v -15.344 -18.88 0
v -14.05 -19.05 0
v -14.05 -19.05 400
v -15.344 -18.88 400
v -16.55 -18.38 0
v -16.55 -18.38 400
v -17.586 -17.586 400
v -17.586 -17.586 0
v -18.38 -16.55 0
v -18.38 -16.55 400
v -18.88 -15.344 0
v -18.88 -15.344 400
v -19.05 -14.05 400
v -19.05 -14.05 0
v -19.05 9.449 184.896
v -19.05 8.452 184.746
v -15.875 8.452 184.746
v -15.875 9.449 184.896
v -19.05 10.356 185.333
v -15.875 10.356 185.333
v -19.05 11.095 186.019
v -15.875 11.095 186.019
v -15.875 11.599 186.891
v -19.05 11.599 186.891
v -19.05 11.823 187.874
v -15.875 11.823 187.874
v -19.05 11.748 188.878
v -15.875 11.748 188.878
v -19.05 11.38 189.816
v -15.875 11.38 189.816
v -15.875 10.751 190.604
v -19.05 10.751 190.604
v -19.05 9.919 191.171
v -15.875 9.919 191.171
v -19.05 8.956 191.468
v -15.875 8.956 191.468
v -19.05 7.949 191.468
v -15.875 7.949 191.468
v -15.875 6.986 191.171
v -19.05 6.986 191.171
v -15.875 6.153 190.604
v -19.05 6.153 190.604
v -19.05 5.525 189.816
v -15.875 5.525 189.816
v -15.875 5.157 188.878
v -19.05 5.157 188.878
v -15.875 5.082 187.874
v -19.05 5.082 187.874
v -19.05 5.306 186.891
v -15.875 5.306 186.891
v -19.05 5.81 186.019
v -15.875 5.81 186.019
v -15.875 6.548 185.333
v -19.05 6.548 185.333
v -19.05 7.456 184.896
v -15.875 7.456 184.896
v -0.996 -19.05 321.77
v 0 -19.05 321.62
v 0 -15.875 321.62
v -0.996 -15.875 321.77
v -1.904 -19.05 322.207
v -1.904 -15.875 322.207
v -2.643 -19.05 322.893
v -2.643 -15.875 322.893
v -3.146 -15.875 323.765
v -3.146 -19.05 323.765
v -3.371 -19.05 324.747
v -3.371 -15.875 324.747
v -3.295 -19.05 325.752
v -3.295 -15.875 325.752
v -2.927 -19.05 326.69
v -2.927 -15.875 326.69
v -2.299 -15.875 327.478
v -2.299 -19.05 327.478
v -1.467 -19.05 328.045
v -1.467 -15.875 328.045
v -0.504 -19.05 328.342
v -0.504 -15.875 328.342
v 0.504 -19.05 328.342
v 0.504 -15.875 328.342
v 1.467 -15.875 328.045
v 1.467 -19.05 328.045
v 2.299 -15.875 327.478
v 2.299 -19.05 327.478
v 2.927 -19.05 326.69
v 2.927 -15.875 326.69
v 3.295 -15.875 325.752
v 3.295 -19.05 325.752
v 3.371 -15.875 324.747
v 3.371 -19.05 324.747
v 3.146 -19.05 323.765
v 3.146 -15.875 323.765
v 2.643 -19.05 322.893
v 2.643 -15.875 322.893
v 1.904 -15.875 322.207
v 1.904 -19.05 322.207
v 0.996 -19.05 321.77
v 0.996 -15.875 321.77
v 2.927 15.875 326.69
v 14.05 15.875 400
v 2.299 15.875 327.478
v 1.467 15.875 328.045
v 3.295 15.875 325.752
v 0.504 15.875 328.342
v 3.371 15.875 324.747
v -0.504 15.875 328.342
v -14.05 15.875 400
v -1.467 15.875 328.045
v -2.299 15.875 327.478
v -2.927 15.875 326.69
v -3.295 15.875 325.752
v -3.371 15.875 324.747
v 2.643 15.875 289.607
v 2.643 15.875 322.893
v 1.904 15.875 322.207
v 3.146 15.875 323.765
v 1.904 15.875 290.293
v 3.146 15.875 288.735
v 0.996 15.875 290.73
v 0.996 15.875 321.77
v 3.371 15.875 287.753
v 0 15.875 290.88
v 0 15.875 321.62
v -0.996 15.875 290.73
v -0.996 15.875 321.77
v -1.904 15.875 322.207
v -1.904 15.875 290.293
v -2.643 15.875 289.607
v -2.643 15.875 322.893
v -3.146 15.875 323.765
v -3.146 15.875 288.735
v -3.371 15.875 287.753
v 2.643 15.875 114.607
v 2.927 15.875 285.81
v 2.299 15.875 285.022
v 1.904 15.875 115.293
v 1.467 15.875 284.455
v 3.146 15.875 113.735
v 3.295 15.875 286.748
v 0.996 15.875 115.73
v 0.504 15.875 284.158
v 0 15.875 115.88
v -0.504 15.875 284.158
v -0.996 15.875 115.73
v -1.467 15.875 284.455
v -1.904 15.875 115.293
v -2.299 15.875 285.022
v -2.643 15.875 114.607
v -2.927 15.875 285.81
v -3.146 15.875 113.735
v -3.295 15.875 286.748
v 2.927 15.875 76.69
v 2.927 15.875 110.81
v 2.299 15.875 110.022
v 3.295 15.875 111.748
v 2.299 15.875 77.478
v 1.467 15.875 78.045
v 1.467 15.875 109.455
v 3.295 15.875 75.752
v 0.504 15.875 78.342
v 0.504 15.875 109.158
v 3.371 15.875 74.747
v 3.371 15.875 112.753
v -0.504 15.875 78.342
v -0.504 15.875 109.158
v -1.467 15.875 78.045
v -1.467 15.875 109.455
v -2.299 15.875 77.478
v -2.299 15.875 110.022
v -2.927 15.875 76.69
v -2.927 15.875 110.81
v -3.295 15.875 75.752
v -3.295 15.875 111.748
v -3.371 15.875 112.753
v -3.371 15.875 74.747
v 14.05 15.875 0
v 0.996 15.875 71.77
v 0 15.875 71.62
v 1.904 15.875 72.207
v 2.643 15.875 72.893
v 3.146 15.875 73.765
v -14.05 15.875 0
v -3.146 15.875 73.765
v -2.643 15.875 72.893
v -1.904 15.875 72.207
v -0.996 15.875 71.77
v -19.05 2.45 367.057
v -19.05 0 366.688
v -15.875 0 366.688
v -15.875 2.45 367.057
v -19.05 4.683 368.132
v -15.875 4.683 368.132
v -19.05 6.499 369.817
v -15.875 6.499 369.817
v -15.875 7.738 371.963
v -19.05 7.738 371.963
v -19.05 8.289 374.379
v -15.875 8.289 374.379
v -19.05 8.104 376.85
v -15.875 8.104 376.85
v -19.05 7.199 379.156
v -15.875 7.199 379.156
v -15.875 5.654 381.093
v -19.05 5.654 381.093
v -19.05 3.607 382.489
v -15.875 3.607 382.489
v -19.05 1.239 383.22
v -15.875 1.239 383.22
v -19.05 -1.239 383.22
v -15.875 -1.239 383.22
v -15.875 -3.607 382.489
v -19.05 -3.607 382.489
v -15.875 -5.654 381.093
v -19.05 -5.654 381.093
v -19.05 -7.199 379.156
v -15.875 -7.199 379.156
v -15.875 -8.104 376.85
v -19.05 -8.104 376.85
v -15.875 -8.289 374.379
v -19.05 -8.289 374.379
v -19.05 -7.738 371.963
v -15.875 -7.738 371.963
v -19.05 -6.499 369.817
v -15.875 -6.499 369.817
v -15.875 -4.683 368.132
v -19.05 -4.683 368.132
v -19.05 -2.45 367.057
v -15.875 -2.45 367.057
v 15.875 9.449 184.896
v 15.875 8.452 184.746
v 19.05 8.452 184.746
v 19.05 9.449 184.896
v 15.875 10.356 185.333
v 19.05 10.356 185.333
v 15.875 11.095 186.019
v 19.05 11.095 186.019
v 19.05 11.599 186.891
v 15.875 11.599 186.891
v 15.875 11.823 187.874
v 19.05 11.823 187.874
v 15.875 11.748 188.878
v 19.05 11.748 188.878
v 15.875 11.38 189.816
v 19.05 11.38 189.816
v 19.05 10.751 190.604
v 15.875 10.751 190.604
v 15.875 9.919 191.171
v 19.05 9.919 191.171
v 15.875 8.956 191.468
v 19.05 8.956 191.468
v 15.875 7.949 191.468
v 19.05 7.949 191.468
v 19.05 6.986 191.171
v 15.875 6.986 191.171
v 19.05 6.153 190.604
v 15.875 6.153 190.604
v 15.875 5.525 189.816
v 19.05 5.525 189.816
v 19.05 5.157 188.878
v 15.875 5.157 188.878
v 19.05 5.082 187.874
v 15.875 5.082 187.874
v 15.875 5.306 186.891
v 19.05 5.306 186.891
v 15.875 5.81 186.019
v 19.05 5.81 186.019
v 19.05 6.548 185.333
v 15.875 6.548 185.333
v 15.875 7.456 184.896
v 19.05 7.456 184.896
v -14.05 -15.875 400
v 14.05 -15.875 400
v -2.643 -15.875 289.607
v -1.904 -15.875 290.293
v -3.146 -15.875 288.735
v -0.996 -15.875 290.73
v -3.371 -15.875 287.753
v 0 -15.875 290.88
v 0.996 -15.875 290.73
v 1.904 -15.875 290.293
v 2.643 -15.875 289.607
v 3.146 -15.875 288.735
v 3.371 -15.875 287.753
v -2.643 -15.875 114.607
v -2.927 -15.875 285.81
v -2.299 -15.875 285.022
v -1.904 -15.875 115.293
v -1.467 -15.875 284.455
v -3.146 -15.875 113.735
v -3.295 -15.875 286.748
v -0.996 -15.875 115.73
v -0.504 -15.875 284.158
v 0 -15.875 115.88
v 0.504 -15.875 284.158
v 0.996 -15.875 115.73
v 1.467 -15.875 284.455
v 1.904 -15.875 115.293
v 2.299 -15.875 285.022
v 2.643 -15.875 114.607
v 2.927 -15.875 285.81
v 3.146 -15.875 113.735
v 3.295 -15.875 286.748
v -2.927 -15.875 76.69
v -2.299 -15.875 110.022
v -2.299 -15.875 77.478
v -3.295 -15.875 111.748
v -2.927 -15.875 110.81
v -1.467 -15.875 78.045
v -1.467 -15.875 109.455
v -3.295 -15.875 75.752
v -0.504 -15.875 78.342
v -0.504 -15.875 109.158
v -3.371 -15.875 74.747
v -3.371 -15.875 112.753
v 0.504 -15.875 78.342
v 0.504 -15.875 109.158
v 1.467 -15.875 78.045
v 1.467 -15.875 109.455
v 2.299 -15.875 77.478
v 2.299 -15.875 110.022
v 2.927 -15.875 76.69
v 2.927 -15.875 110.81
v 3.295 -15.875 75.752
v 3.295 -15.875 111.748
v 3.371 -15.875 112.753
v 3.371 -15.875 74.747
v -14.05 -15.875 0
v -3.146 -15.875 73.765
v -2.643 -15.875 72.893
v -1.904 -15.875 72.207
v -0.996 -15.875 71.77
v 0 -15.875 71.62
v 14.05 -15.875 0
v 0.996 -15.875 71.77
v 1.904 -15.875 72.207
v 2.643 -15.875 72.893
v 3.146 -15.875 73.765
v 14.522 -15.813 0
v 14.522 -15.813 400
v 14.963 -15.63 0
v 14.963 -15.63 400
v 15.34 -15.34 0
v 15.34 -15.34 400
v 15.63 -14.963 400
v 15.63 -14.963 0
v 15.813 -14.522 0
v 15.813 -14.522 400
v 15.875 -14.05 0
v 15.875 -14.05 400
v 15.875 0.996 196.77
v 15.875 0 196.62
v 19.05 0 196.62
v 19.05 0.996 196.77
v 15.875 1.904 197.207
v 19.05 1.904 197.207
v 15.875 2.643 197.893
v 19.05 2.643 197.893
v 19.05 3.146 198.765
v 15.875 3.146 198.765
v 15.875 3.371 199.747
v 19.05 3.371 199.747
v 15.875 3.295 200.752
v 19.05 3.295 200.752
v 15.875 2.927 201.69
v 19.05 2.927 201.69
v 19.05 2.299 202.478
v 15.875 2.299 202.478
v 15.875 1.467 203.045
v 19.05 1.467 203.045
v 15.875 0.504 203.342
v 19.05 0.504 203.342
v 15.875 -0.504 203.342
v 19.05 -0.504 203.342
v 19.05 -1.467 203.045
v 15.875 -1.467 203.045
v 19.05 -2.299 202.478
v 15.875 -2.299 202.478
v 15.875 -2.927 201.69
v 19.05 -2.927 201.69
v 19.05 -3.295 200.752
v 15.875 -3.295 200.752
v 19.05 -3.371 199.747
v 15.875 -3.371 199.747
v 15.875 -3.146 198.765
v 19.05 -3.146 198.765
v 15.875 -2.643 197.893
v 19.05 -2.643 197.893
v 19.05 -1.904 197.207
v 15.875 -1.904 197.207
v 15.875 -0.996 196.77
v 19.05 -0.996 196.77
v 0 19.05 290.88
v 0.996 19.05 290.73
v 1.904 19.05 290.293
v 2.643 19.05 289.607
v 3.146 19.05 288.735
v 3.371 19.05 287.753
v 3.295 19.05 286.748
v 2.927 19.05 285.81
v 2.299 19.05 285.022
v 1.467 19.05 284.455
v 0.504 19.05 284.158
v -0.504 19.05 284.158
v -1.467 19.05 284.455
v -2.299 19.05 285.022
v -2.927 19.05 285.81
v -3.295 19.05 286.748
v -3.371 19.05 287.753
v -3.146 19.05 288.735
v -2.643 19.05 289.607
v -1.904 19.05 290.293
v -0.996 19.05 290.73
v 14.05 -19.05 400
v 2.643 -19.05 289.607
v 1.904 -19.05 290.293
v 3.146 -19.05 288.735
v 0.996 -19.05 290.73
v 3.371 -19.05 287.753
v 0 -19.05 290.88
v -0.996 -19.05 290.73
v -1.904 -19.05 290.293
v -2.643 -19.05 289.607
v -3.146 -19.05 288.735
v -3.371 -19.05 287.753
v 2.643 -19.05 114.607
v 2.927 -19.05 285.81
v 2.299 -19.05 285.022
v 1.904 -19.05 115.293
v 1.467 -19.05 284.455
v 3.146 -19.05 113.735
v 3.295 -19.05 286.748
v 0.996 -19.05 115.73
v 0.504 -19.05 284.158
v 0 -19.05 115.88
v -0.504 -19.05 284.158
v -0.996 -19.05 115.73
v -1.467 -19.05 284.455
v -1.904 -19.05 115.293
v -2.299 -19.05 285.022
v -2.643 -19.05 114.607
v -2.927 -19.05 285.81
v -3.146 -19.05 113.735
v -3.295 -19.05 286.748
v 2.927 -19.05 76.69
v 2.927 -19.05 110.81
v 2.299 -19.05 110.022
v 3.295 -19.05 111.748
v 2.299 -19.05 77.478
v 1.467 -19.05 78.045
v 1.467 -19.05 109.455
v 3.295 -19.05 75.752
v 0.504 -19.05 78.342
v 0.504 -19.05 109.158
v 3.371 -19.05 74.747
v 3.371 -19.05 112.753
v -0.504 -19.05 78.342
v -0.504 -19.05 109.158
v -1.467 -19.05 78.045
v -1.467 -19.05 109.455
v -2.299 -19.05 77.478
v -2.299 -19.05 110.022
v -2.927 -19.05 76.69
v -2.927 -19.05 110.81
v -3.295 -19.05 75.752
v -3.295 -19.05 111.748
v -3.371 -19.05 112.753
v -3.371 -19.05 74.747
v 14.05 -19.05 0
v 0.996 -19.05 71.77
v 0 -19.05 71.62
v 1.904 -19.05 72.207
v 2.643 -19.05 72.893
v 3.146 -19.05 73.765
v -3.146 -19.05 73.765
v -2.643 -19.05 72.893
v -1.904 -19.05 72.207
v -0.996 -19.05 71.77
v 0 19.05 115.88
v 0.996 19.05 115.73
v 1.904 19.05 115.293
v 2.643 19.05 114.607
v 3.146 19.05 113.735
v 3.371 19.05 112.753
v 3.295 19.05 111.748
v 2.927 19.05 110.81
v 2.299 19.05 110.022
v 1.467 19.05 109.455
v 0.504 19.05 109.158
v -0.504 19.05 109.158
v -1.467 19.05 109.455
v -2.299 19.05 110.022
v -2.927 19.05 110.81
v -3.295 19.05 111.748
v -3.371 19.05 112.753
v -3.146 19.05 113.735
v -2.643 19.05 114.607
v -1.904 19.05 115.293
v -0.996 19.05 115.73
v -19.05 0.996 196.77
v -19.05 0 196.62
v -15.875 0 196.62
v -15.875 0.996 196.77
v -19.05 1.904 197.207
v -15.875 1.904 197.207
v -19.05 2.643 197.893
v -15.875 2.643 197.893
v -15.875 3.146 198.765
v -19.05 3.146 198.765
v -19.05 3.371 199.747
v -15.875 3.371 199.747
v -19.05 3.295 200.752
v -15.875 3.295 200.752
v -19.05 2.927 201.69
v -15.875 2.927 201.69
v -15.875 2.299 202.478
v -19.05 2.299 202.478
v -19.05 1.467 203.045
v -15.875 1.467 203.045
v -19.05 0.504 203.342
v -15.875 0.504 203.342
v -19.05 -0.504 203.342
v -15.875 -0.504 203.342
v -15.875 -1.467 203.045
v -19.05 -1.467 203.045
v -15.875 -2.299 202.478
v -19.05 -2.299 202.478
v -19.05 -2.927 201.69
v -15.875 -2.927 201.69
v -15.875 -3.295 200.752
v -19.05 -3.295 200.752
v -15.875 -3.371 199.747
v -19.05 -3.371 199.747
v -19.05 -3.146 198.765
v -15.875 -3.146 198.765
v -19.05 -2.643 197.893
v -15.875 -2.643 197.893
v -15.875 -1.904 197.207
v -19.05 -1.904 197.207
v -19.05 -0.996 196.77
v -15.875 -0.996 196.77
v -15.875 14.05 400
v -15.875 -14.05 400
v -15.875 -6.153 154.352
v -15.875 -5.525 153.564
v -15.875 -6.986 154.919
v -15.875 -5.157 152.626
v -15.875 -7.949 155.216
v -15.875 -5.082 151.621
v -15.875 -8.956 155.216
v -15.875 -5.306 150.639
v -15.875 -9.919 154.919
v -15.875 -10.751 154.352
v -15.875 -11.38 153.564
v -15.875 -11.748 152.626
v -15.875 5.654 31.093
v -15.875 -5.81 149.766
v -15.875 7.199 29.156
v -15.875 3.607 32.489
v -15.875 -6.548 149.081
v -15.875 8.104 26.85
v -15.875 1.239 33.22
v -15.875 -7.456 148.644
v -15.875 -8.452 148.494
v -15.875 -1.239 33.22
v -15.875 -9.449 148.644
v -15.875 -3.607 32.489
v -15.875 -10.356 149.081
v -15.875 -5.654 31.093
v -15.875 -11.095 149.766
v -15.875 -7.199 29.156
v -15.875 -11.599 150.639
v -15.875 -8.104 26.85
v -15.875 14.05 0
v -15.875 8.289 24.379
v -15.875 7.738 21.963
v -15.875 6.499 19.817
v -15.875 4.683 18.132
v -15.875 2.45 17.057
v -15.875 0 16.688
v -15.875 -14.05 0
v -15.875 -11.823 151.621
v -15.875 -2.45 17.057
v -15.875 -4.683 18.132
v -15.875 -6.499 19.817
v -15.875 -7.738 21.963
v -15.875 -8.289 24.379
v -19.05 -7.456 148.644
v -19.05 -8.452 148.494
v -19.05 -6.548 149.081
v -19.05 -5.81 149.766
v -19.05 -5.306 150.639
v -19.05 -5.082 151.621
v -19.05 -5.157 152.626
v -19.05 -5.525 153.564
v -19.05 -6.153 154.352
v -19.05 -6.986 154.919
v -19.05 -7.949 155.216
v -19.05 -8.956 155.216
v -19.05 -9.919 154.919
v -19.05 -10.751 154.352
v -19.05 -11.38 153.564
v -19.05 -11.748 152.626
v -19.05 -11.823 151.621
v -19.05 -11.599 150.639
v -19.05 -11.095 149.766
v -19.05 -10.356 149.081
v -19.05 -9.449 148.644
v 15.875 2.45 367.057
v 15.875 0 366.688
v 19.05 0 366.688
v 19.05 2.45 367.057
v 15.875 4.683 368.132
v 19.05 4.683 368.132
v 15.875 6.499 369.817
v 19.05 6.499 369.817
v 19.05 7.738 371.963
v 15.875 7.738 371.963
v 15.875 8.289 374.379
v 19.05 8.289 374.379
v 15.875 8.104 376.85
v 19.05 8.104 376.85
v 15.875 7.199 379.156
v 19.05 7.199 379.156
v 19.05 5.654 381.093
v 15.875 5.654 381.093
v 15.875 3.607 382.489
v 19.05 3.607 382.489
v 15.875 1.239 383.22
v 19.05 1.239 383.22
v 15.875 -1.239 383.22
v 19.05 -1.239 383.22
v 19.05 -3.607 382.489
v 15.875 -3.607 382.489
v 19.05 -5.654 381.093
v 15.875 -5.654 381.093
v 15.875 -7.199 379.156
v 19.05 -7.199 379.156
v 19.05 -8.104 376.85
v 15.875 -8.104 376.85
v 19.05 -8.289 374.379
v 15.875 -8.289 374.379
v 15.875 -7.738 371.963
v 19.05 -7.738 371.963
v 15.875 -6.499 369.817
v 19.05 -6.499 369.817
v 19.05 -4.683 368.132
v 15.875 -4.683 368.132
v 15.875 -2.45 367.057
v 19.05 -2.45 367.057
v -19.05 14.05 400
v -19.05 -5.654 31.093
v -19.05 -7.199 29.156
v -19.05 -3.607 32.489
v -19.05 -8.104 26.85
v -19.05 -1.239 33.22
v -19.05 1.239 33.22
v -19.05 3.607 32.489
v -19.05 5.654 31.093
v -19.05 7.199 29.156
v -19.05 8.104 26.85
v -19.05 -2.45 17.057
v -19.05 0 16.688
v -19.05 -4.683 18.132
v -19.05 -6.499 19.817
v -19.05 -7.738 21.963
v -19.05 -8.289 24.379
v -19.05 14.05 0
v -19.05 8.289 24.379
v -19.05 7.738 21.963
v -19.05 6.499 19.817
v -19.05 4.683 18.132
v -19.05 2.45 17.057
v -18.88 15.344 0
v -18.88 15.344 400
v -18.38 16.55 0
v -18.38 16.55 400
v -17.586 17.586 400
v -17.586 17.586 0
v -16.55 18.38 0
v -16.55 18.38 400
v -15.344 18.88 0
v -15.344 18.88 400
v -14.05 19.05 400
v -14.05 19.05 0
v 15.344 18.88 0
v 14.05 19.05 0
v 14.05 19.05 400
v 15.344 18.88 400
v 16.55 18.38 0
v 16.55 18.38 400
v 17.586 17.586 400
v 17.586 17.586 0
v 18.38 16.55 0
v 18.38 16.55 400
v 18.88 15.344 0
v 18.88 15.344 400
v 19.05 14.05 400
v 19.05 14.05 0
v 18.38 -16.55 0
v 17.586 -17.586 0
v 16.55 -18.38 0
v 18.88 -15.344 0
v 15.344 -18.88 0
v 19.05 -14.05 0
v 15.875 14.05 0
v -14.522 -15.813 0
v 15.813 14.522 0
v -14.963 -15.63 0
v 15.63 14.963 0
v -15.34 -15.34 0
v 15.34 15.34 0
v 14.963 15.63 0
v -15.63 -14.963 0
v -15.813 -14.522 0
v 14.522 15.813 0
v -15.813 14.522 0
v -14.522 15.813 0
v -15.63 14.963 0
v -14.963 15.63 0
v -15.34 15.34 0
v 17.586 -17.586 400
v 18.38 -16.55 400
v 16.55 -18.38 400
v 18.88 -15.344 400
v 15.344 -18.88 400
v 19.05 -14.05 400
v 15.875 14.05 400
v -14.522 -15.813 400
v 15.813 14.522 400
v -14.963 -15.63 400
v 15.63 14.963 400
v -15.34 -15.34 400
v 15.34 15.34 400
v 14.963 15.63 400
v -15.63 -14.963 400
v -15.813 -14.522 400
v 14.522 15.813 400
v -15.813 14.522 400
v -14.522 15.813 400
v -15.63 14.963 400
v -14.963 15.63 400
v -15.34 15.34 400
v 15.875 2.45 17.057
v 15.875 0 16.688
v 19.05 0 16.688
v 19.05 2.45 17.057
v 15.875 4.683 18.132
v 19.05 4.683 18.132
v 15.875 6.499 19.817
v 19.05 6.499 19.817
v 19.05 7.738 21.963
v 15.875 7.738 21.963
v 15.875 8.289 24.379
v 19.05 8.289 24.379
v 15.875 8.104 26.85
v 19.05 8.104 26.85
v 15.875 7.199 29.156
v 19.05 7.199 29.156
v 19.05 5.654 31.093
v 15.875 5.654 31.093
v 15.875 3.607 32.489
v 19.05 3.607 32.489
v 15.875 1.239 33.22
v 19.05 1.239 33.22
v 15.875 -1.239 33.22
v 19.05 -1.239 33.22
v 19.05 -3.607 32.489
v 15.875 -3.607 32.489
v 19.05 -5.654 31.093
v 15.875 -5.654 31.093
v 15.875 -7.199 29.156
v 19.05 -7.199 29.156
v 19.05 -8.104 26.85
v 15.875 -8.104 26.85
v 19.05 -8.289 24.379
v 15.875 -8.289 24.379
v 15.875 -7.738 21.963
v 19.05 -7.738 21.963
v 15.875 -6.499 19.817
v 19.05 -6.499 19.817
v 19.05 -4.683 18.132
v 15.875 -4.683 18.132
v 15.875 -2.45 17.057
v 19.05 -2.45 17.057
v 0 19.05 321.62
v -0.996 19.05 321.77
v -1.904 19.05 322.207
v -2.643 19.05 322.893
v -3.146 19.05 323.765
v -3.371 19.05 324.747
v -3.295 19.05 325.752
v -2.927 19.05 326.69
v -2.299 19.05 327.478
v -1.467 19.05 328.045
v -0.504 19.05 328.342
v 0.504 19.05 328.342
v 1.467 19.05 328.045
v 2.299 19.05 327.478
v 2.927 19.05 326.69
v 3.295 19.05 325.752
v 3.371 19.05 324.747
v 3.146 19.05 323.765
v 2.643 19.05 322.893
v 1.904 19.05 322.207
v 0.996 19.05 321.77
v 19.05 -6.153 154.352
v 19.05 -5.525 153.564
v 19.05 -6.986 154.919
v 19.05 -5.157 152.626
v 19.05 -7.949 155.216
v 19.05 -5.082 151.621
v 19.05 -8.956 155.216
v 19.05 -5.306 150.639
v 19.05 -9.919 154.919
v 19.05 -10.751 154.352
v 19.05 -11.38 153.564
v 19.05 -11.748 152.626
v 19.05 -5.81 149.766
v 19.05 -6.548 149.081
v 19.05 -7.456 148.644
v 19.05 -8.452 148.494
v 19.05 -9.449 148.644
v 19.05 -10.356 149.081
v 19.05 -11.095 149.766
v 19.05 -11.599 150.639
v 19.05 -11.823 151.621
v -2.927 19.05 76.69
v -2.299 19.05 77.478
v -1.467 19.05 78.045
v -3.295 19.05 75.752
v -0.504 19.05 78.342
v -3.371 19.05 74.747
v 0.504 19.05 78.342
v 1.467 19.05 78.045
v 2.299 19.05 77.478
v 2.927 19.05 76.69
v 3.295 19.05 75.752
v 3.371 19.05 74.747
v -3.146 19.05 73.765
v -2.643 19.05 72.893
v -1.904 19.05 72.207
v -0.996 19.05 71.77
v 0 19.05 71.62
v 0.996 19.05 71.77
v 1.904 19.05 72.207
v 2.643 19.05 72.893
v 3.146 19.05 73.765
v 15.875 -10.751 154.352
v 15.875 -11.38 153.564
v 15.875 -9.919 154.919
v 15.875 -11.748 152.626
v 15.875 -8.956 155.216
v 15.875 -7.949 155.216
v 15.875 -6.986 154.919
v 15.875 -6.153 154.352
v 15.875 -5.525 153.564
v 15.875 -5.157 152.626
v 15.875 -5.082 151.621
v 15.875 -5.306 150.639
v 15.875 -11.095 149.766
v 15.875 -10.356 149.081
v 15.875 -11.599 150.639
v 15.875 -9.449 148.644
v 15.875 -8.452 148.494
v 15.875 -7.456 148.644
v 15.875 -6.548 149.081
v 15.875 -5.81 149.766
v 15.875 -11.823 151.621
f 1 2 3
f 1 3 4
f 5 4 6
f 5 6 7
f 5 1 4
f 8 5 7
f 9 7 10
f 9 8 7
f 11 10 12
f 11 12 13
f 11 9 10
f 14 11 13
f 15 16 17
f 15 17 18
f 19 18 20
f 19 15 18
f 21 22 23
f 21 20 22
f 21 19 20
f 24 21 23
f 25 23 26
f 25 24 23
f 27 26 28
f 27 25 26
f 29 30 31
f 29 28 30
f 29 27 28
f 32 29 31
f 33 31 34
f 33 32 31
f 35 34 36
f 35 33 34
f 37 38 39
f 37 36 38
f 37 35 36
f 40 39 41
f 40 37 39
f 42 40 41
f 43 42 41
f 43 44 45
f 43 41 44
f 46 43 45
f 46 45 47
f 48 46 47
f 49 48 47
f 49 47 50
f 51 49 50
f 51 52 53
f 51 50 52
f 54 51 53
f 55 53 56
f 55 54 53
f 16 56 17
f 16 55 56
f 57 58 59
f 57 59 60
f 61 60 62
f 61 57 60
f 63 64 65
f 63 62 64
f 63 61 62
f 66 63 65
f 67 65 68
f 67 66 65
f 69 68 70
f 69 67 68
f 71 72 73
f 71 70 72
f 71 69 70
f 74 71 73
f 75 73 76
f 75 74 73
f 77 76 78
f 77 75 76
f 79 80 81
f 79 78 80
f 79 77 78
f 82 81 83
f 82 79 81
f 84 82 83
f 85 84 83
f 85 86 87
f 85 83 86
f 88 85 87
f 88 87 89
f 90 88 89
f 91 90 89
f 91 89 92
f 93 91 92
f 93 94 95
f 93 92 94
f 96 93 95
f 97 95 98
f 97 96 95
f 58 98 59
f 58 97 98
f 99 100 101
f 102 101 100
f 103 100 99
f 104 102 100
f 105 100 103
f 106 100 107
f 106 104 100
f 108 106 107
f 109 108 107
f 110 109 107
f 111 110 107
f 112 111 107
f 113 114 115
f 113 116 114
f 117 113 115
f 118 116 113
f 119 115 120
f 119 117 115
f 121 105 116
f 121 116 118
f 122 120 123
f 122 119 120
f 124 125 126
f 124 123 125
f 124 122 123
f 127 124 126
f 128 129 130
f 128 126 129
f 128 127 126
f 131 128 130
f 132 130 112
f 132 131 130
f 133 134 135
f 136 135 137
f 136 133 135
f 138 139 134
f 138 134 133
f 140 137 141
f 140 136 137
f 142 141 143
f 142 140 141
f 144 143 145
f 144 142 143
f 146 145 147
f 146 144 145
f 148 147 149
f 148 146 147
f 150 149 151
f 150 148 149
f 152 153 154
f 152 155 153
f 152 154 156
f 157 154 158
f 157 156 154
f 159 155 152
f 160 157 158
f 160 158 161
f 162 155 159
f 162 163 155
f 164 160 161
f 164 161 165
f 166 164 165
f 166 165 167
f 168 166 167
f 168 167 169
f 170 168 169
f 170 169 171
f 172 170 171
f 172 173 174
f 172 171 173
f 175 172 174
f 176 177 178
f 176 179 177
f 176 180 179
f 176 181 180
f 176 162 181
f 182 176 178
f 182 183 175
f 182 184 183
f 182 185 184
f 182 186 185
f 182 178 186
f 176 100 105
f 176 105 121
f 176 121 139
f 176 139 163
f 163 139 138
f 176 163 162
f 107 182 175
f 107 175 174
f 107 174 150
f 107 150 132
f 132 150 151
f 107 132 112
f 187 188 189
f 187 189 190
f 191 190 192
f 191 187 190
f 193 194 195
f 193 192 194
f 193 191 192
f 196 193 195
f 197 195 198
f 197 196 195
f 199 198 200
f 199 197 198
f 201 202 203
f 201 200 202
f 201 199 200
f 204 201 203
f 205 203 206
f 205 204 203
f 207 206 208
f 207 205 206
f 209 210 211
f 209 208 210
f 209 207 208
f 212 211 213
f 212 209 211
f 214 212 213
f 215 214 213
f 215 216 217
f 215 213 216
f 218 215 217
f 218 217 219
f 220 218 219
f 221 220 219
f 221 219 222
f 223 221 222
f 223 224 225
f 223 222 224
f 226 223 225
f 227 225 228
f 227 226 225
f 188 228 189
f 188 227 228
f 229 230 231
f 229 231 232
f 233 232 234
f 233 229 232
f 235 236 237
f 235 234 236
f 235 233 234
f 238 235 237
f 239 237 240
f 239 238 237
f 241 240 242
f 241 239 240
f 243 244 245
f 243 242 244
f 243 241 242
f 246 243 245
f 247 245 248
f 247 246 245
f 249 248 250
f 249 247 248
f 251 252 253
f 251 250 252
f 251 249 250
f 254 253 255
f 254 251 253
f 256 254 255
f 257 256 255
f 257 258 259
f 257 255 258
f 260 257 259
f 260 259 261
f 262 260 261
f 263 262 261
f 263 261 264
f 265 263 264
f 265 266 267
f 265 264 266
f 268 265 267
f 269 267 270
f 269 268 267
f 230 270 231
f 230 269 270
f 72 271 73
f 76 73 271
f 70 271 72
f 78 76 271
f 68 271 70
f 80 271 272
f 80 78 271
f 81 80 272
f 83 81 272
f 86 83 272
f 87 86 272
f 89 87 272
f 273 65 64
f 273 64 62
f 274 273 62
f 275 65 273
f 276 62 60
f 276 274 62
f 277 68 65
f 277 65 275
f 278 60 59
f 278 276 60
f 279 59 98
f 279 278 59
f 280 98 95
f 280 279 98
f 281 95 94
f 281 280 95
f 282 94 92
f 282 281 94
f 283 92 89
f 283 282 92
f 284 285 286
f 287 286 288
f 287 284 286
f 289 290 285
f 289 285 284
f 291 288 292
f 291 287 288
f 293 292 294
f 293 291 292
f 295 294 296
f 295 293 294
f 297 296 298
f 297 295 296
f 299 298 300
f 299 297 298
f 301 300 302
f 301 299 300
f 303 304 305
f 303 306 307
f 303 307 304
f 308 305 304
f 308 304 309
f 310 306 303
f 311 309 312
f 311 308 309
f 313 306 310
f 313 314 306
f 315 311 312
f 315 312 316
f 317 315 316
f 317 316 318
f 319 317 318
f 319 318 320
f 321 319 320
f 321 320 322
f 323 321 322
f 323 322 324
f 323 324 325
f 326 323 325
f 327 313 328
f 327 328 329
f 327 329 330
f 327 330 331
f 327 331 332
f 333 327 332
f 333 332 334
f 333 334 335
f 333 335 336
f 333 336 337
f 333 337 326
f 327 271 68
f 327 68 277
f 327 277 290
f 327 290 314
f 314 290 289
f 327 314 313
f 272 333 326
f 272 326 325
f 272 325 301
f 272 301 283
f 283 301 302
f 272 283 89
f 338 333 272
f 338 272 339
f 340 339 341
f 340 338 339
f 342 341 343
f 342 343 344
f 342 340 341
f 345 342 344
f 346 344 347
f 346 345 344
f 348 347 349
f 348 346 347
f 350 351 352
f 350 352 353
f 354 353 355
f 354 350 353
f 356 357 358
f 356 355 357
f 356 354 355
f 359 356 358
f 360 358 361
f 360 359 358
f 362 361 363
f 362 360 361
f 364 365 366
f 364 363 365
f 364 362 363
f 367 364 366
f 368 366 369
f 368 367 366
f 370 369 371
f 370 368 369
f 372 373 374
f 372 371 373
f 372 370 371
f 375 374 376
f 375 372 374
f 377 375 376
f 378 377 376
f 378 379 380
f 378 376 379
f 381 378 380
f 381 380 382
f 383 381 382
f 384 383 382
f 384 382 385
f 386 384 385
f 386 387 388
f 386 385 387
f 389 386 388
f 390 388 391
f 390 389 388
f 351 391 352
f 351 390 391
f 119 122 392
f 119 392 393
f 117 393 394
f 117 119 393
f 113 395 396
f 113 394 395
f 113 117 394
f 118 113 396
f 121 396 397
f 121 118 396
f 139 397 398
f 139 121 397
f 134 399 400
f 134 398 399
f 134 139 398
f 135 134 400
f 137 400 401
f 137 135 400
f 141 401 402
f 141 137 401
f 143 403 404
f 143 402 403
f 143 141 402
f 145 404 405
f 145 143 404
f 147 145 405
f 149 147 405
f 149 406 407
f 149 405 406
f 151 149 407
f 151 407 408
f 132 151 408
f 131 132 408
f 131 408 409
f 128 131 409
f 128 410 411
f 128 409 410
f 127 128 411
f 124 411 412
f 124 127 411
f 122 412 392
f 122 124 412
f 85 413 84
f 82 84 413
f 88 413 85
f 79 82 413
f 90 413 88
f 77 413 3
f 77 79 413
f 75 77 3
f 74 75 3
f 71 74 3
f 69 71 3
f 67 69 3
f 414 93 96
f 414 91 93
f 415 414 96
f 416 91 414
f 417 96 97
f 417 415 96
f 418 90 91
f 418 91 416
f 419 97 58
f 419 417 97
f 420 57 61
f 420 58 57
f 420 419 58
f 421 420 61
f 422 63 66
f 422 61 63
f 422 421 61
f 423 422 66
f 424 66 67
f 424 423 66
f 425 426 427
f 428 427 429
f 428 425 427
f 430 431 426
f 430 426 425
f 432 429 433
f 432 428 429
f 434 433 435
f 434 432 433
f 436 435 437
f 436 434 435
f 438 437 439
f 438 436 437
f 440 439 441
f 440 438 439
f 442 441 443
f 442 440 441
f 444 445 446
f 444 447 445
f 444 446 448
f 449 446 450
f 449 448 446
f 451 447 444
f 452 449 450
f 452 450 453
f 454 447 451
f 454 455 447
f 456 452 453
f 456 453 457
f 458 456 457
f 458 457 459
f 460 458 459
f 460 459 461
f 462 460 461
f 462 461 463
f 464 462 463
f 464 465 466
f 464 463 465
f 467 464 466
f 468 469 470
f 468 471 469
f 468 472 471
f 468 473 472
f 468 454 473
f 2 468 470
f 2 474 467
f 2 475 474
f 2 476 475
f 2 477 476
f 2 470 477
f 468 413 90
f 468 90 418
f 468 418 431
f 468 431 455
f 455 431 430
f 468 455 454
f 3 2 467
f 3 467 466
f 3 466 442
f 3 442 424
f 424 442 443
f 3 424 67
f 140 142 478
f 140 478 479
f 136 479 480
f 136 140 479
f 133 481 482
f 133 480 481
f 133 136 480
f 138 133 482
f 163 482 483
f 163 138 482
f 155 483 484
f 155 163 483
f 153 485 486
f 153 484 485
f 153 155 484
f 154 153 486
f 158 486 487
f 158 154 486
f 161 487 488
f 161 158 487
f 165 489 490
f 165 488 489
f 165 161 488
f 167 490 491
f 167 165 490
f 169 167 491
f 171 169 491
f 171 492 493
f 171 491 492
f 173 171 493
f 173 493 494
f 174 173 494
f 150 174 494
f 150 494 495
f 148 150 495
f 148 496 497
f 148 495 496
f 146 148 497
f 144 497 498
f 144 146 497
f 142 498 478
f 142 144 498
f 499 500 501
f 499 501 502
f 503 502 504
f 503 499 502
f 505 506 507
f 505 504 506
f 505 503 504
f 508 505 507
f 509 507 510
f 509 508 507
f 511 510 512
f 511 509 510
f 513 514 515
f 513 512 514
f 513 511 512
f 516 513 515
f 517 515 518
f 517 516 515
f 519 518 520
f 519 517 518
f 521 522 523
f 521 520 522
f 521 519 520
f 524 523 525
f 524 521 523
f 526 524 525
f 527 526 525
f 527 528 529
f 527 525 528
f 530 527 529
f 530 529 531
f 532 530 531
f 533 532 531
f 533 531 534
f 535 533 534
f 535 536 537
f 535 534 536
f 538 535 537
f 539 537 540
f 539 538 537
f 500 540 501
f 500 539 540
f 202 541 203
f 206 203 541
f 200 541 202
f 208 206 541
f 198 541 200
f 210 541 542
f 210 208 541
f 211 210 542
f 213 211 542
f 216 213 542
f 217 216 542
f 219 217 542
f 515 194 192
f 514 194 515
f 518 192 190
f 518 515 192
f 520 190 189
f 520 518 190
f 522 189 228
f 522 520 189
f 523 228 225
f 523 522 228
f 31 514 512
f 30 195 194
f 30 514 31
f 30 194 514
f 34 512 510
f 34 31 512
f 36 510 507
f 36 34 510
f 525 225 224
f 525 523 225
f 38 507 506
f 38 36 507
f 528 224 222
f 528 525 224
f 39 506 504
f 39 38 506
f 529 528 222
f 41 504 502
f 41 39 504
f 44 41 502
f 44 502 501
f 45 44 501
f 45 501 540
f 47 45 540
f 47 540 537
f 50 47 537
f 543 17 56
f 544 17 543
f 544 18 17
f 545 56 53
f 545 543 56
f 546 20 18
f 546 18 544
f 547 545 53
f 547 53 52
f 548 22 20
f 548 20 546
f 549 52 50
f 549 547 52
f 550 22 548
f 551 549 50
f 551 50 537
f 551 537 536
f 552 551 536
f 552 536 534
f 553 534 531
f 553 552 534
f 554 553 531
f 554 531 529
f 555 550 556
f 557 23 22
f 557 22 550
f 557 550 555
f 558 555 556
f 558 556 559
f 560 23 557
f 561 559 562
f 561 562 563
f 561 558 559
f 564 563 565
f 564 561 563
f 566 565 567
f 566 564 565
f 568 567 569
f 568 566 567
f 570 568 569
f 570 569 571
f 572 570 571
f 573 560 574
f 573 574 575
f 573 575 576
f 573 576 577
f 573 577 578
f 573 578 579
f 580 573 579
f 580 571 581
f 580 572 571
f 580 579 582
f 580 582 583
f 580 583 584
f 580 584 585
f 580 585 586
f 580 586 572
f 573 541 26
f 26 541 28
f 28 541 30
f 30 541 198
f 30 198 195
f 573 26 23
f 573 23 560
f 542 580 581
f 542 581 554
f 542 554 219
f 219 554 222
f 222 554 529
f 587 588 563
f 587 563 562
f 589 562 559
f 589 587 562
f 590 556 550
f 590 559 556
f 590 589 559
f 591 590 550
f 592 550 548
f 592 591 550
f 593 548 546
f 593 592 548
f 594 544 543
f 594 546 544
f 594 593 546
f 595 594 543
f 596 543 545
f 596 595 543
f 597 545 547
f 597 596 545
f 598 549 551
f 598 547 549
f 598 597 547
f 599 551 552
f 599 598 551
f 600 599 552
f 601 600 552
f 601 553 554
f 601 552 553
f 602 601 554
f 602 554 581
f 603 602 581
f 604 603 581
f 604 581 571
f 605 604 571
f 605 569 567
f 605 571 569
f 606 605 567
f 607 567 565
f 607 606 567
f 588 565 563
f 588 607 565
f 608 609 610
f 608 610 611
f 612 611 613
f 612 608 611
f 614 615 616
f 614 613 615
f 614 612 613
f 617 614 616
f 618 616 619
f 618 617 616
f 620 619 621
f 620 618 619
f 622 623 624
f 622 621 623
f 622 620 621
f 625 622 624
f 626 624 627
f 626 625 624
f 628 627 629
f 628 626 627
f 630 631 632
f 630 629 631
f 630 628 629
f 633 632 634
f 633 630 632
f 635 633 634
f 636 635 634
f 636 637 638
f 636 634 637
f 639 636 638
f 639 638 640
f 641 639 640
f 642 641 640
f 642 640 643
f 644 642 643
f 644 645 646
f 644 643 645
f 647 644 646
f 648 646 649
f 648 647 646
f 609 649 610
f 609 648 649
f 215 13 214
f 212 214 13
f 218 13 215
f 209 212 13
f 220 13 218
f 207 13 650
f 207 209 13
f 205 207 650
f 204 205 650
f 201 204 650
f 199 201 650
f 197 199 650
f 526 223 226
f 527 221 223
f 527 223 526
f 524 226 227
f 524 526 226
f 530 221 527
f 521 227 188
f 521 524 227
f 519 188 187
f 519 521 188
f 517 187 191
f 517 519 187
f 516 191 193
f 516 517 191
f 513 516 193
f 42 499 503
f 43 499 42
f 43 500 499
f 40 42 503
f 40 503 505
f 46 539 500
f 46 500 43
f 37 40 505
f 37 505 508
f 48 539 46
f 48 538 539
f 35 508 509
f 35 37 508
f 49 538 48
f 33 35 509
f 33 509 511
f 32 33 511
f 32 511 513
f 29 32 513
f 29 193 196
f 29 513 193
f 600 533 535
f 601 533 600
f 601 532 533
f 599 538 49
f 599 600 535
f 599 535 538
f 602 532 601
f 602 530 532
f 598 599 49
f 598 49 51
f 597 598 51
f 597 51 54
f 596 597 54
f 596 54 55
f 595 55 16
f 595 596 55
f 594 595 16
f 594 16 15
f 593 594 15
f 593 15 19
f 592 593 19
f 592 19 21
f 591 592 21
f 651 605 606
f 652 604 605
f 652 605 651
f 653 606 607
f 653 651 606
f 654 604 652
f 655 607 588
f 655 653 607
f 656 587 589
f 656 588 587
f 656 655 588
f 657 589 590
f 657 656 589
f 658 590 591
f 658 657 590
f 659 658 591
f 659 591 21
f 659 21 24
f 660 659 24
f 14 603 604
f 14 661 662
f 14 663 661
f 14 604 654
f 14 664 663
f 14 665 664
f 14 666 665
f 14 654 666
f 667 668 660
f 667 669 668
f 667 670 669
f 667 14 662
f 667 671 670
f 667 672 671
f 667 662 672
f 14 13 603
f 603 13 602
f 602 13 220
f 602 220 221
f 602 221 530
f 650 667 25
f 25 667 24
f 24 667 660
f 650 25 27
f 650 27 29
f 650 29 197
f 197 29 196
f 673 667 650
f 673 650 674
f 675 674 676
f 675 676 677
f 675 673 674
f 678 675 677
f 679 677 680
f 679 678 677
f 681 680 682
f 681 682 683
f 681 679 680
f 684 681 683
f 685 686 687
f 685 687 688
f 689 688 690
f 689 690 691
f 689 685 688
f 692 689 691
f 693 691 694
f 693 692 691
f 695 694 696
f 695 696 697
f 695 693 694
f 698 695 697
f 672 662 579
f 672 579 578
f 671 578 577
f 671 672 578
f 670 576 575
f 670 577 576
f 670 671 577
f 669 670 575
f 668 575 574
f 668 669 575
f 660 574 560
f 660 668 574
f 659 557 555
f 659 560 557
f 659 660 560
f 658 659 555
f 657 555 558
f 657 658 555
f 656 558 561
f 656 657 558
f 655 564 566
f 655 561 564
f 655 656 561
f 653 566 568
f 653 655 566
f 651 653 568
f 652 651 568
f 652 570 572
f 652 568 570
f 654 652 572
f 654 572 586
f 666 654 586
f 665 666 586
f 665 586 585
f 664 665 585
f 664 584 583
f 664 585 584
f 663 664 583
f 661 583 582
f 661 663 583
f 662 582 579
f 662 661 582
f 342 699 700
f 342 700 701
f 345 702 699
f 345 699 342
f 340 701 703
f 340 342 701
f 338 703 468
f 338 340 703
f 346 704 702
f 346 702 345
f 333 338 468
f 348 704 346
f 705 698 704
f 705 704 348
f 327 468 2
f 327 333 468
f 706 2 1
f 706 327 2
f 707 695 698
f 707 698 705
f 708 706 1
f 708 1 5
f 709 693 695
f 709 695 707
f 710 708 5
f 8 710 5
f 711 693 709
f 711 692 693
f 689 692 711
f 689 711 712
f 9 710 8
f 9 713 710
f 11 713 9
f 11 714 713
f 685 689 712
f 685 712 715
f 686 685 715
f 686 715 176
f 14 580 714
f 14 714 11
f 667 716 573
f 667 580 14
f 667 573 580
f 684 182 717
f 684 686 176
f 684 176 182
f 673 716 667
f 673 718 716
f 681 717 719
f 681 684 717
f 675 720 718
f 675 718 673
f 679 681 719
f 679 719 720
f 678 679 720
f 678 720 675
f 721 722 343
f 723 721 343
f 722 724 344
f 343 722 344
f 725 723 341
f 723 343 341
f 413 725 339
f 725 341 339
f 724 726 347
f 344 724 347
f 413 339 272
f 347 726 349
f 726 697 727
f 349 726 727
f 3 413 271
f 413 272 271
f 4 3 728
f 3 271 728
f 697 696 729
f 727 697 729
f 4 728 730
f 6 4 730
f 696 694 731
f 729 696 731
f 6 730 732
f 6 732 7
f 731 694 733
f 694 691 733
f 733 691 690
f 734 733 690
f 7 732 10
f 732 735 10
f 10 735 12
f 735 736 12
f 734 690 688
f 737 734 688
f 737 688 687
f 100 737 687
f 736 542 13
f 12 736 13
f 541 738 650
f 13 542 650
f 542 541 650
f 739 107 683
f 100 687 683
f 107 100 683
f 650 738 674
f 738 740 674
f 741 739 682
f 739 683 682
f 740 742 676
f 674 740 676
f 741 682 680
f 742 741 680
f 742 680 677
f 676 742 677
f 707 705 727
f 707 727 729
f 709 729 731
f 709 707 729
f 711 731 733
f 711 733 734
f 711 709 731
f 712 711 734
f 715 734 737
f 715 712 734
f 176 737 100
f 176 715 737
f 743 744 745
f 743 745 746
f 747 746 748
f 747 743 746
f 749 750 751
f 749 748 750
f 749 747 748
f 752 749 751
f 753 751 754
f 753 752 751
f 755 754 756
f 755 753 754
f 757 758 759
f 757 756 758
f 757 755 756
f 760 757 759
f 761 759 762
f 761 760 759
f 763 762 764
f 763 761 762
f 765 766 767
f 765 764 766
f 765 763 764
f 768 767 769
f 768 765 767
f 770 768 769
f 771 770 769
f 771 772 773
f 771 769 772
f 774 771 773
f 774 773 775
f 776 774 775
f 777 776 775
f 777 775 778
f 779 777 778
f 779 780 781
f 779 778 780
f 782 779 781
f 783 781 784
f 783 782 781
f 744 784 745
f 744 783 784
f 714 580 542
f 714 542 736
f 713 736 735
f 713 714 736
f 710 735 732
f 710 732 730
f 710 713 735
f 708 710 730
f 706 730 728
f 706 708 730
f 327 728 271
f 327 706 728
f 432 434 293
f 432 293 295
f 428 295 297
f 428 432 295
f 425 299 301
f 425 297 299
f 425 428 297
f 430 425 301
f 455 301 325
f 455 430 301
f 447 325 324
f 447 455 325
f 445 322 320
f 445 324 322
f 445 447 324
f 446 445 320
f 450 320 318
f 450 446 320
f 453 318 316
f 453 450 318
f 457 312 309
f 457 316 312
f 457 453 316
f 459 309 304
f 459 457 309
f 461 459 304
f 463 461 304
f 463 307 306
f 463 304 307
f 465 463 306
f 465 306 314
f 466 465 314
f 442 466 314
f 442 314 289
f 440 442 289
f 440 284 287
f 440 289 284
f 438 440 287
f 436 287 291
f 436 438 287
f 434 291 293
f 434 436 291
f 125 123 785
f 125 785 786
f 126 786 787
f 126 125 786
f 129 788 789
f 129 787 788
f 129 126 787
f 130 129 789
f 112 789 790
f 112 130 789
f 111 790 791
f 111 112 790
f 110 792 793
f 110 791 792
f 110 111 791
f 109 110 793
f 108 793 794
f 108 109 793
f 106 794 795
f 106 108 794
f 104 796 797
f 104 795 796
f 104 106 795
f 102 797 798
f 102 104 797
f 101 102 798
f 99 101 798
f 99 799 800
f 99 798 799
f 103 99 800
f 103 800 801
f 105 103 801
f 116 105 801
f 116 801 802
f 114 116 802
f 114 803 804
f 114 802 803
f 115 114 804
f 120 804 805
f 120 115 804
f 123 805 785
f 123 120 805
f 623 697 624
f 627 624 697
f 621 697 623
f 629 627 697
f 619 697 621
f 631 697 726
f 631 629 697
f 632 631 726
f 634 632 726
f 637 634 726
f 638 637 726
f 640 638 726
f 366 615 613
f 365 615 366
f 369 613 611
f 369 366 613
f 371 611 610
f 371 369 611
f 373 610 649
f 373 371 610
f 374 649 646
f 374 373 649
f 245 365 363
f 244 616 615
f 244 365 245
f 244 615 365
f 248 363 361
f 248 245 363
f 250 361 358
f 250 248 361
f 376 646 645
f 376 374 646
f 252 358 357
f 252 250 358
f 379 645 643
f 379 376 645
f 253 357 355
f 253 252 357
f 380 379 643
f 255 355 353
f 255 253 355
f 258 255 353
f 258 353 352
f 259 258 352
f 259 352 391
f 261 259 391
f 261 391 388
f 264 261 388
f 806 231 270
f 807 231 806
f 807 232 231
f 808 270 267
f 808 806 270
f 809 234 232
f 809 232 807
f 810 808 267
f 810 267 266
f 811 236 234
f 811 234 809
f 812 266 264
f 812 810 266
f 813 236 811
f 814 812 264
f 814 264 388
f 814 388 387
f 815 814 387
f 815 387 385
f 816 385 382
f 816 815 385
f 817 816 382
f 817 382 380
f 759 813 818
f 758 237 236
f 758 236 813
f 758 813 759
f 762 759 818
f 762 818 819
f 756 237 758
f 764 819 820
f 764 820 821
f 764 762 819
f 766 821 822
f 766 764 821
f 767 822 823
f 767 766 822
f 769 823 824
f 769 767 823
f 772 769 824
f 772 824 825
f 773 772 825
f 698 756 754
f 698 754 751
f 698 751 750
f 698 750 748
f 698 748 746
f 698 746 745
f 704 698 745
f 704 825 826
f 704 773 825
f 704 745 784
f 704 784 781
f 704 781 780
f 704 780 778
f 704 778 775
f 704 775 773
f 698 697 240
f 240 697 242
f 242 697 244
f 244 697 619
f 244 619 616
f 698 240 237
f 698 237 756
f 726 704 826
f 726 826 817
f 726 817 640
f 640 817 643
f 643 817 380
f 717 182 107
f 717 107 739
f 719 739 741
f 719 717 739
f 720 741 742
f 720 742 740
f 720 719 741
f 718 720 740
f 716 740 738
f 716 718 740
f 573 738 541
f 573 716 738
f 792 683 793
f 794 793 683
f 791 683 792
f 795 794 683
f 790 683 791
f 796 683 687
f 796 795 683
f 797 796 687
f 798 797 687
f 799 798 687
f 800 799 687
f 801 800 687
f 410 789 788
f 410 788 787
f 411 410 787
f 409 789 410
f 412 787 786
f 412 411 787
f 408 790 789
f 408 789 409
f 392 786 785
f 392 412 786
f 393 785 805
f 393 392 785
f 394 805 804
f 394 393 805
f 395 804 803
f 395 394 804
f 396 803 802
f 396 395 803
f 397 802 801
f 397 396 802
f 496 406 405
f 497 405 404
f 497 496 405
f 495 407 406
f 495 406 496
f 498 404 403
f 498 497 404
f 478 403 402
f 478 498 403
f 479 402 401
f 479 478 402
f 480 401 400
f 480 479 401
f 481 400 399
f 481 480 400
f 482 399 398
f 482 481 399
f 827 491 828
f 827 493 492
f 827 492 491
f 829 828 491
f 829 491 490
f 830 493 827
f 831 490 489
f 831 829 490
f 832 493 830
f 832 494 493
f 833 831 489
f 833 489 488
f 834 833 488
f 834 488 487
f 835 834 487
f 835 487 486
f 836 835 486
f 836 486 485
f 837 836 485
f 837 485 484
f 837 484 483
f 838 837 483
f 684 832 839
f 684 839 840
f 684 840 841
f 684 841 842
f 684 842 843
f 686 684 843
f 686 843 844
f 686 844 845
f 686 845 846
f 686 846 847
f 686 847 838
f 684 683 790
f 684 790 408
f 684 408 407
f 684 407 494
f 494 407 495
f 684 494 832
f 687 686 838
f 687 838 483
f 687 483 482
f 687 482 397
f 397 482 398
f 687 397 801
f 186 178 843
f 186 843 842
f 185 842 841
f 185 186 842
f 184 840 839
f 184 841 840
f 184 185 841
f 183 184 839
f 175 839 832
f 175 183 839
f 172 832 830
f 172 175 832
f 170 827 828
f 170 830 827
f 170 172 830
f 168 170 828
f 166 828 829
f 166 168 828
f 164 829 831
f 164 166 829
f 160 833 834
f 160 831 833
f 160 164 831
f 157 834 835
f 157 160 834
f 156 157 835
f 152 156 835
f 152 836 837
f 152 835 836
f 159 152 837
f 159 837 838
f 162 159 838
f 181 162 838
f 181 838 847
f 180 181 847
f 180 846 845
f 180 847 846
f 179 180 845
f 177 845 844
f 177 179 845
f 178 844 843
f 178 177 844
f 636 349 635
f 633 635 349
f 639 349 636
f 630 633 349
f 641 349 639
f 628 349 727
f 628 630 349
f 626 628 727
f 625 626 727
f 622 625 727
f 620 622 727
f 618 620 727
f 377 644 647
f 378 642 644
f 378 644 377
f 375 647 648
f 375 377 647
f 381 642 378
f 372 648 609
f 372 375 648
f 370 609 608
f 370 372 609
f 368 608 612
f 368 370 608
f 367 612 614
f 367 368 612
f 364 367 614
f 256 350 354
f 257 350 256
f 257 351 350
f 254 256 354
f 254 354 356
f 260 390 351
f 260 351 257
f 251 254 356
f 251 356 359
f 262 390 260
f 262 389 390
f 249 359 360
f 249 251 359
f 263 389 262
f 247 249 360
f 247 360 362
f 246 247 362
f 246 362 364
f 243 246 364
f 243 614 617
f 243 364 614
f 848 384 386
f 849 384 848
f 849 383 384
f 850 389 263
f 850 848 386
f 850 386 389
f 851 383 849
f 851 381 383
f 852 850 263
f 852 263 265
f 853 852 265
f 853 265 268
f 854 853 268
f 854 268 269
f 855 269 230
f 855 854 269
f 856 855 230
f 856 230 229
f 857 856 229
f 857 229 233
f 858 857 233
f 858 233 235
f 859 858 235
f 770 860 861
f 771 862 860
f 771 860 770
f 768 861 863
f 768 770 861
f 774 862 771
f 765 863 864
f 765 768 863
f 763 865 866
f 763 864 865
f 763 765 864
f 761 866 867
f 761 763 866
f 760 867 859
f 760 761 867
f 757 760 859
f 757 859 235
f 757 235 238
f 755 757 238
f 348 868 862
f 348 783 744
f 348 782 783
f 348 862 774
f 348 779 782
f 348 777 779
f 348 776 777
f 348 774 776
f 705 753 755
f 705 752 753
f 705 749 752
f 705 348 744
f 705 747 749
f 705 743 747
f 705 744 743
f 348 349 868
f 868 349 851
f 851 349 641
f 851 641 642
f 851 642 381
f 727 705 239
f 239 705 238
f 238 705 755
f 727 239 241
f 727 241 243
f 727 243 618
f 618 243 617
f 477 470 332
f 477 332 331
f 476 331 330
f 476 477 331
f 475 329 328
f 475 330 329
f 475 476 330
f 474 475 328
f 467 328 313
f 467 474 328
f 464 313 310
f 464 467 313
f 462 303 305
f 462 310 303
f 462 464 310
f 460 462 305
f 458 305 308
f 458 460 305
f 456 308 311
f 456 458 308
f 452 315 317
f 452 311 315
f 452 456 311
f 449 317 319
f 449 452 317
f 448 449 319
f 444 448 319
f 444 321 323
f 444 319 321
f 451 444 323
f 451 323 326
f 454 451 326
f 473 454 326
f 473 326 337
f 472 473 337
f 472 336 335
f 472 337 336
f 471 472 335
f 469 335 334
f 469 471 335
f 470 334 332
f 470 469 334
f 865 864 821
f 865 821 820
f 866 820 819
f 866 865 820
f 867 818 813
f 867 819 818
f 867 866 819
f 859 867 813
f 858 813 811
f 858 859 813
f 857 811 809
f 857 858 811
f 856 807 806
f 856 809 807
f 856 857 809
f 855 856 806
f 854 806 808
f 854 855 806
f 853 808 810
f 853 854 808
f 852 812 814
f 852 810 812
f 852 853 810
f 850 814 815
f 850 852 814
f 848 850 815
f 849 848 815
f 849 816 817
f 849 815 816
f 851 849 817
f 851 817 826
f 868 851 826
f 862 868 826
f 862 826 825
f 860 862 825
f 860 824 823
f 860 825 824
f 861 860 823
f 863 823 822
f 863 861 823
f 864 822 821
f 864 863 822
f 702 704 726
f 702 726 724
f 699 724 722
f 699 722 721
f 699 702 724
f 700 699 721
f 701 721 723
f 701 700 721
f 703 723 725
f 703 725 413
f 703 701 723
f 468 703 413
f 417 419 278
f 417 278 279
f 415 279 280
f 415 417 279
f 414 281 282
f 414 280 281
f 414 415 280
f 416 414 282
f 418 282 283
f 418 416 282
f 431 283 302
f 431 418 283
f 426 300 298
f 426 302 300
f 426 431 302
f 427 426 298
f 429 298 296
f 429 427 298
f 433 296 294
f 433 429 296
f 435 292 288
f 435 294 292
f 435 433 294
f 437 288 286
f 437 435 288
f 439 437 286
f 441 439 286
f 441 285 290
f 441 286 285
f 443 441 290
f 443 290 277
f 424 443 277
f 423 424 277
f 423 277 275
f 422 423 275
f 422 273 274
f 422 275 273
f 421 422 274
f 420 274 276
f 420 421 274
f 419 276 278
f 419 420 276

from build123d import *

# Parameters (mm, degrees)
BOSS_EXTRUDE1_DEPTH             = 400
CUT_EXTRUDE1_DEPTH              = 401.906229685
CUT_EXTRUDE1_DEPTH_BACK         = 401.906229685
SKETCH2_R                       = 8.3125
CUT_EXTRUDE2_DEPTH              = 401.906229685
CUT_EXTRUDE2_DEPTH_BACK         = 401.906229685
SKETCH3_R                       = 3.38
CUT_EXTRUDE3_DEPTH              = 401.906229685
CUT_EXTRUDE3_DEPTH_BACK         = 401.906229685
SKETCH4_R                       = 3.38
CUT_EXTRUDE4_DEPTH              = 401.906229685
CUT_EXTRUDE4_DEPTH_BACK         = 401.906229685
SKETCH5_R                       = 3.38
BROOM_MOUNTING_HOLES_DEPTH      = 401.906229685
BROOM_MOUNTING_HOLES_DEPTH_BACK = 401.906229685
SKETCH6_R                       = 3.38


with BuildPart() as part:
    # Sketch1 → Boss-Extrude1 (new body)
    with BuildSketch(Plane.XY):
        with BuildLine():
            Line((-14.05, 19.05), (14.05, 19.05))
            ThreePointArc((14.05, 19.05), (17.585533906, 17.585533906), (19.05, 14.05))
            Line((19.05, 14.05), (19.05, -14.05))
            ThreePointArc((19.05, -14.05), (17.585533906, -17.585533906), (14.05, -19.05))
            Line((14.05, -19.05), (-14.05, -19.05))
            ThreePointArc((-14.05, -19.05), (-17.585533906, -17.585533906), (-19.05, -14.05))
            Line((-19.05, -14.05), (-19.05, 14.05))
            ThreePointArc((-19.05, 14.05), (-17.585533906, 17.585533906), (-14.05, 19.05))
        make_face()
        with BuildLine():
            Line((-15.875, 14.05), (-15.875, -14.05))
            ThreePointArc((-15.875, -14.05), (-15.340469876, -15.340469876), (-14.05, -15.875))
            Line((-14.05, -15.875), (14.05, -15.875))
            ThreePointArc((14.05, -15.875), (15.340469876, -15.340469876), (15.875, -14.05))
            Line((15.875, -14.05), (15.875, 14.05))
            ThreePointArc((15.875, 14.05), (15.340469876, 15.340469876), (14.05, 15.875))
            Line((14.05, 15.875), (-14.05, 15.875))
            ThreePointArc((-14.05, 15.875), (-15.340469876, 15.340469876), (-15.875, 14.05))
        make_face(mode=Mode.SUBTRACT)
    extrude(amount=BOSS_EXTRUDE1_DEPTH)

    # Sketch2 → Cut-Extrude1 (cut, two sides: drawn at the far end of the back side and taken through both)
    with BuildSketch(Plane(origin=(0, 0, 0), x_dir=(0, 0, -1), z_dir=(1, 0, 0)).offset(-CUT_EXTRUDE1_DEPTH_BACK)):
        with Locations((-375, 0)):
            Circle(SKETCH2_R)
        with Locations((-25, 0)):
            Circle(SKETCH2_R)
    extrude(amount=CUT_EXTRUDE1_DEPTH + CUT_EXTRUDE1_DEPTH_BACK, mode=Mode.SUBTRACT)

    # Sketch3 → Cut-Extrude2 (cut, two sides: drawn at the far end of the back side and taken through both)
    with BuildSketch(Plane(origin=(0, 0, 0), x_dir=(1, 0, 0), z_dir=(0, 1, 0)).offset(-CUT_EXTRUDE2_DEPTH_BACK)):
        with Locations(Location((0, -325, 0), (0, 0, 90))):
            Circle(SKETCH3_R)
        with Locations(Location((0, -75, 0), (0, 0, 90))):
            Circle(SKETCH3_R)
    extrude(amount=CUT_EXTRUDE2_DEPTH + CUT_EXTRUDE2_DEPTH_BACK, mode=Mode.SUBTRACT)

    # Sketch4 → Cut-Extrude3 (cut, two sides: drawn at the far end of the back side and taken through both)
    with BuildSketch(Plane(origin=(0, 0, 0), x_dir=(0, 0, -1), z_dir=(1, 0, 0)).offset(-CUT_EXTRUDE3_DEPTH_BACK)):
        with Locations((-200, 0)):
            Circle(SKETCH4_R)
    extrude(amount=CUT_EXTRUDE3_DEPTH + CUT_EXTRUDE3_DEPTH_BACK, mode=Mode.SUBTRACT)

    # Sketch5 → Cut-Extrude4 (cut, two sides: drawn at the far end of the back side and taken through both)
    with BuildSketch(Plane(origin=(0, 0, 0), x_dir=(0, 0, -1), z_dir=(1, 0, 0)).offset(-CUT_EXTRUDE4_DEPTH_BACK)):
        with Locations((-188.126155741, 8.452365235)):
            Circle(SKETCH5_R)
        with Locations((-151.873844259, -8.452365235)):
            Circle(SKETCH5_R)
    extrude(amount=CUT_EXTRUDE4_DEPTH + CUT_EXTRUDE4_DEPTH_BACK, mode=Mode.SUBTRACT)

    # Sketch6 → Broom Mounting Holes (cut, two sides: drawn at the far end of the back side and taken through both)
    with BuildSketch(Plane(origin=(0, 0, 0), x_dir=(1, 0, 0), z_dir=(0, 1, 0)).offset(-BROOM_MOUNTING_HOLES_DEPTH_BACK)):
        with Locations(Location((0, -112.5, 0), (0, 0, 270))):
            Circle(SKETCH6_R)
        with Locations(Location((0, -287.5, 0), (0, 0, 270))):
            Circle(SKETCH6_R)
    extrude(amount=BROOM_MOUNTING_HOLES_DEPTH + BROOM_MOUNTING_HOLES_DEPTH_BACK, mode=Mode.SUBTRACT)


solid = part.part
